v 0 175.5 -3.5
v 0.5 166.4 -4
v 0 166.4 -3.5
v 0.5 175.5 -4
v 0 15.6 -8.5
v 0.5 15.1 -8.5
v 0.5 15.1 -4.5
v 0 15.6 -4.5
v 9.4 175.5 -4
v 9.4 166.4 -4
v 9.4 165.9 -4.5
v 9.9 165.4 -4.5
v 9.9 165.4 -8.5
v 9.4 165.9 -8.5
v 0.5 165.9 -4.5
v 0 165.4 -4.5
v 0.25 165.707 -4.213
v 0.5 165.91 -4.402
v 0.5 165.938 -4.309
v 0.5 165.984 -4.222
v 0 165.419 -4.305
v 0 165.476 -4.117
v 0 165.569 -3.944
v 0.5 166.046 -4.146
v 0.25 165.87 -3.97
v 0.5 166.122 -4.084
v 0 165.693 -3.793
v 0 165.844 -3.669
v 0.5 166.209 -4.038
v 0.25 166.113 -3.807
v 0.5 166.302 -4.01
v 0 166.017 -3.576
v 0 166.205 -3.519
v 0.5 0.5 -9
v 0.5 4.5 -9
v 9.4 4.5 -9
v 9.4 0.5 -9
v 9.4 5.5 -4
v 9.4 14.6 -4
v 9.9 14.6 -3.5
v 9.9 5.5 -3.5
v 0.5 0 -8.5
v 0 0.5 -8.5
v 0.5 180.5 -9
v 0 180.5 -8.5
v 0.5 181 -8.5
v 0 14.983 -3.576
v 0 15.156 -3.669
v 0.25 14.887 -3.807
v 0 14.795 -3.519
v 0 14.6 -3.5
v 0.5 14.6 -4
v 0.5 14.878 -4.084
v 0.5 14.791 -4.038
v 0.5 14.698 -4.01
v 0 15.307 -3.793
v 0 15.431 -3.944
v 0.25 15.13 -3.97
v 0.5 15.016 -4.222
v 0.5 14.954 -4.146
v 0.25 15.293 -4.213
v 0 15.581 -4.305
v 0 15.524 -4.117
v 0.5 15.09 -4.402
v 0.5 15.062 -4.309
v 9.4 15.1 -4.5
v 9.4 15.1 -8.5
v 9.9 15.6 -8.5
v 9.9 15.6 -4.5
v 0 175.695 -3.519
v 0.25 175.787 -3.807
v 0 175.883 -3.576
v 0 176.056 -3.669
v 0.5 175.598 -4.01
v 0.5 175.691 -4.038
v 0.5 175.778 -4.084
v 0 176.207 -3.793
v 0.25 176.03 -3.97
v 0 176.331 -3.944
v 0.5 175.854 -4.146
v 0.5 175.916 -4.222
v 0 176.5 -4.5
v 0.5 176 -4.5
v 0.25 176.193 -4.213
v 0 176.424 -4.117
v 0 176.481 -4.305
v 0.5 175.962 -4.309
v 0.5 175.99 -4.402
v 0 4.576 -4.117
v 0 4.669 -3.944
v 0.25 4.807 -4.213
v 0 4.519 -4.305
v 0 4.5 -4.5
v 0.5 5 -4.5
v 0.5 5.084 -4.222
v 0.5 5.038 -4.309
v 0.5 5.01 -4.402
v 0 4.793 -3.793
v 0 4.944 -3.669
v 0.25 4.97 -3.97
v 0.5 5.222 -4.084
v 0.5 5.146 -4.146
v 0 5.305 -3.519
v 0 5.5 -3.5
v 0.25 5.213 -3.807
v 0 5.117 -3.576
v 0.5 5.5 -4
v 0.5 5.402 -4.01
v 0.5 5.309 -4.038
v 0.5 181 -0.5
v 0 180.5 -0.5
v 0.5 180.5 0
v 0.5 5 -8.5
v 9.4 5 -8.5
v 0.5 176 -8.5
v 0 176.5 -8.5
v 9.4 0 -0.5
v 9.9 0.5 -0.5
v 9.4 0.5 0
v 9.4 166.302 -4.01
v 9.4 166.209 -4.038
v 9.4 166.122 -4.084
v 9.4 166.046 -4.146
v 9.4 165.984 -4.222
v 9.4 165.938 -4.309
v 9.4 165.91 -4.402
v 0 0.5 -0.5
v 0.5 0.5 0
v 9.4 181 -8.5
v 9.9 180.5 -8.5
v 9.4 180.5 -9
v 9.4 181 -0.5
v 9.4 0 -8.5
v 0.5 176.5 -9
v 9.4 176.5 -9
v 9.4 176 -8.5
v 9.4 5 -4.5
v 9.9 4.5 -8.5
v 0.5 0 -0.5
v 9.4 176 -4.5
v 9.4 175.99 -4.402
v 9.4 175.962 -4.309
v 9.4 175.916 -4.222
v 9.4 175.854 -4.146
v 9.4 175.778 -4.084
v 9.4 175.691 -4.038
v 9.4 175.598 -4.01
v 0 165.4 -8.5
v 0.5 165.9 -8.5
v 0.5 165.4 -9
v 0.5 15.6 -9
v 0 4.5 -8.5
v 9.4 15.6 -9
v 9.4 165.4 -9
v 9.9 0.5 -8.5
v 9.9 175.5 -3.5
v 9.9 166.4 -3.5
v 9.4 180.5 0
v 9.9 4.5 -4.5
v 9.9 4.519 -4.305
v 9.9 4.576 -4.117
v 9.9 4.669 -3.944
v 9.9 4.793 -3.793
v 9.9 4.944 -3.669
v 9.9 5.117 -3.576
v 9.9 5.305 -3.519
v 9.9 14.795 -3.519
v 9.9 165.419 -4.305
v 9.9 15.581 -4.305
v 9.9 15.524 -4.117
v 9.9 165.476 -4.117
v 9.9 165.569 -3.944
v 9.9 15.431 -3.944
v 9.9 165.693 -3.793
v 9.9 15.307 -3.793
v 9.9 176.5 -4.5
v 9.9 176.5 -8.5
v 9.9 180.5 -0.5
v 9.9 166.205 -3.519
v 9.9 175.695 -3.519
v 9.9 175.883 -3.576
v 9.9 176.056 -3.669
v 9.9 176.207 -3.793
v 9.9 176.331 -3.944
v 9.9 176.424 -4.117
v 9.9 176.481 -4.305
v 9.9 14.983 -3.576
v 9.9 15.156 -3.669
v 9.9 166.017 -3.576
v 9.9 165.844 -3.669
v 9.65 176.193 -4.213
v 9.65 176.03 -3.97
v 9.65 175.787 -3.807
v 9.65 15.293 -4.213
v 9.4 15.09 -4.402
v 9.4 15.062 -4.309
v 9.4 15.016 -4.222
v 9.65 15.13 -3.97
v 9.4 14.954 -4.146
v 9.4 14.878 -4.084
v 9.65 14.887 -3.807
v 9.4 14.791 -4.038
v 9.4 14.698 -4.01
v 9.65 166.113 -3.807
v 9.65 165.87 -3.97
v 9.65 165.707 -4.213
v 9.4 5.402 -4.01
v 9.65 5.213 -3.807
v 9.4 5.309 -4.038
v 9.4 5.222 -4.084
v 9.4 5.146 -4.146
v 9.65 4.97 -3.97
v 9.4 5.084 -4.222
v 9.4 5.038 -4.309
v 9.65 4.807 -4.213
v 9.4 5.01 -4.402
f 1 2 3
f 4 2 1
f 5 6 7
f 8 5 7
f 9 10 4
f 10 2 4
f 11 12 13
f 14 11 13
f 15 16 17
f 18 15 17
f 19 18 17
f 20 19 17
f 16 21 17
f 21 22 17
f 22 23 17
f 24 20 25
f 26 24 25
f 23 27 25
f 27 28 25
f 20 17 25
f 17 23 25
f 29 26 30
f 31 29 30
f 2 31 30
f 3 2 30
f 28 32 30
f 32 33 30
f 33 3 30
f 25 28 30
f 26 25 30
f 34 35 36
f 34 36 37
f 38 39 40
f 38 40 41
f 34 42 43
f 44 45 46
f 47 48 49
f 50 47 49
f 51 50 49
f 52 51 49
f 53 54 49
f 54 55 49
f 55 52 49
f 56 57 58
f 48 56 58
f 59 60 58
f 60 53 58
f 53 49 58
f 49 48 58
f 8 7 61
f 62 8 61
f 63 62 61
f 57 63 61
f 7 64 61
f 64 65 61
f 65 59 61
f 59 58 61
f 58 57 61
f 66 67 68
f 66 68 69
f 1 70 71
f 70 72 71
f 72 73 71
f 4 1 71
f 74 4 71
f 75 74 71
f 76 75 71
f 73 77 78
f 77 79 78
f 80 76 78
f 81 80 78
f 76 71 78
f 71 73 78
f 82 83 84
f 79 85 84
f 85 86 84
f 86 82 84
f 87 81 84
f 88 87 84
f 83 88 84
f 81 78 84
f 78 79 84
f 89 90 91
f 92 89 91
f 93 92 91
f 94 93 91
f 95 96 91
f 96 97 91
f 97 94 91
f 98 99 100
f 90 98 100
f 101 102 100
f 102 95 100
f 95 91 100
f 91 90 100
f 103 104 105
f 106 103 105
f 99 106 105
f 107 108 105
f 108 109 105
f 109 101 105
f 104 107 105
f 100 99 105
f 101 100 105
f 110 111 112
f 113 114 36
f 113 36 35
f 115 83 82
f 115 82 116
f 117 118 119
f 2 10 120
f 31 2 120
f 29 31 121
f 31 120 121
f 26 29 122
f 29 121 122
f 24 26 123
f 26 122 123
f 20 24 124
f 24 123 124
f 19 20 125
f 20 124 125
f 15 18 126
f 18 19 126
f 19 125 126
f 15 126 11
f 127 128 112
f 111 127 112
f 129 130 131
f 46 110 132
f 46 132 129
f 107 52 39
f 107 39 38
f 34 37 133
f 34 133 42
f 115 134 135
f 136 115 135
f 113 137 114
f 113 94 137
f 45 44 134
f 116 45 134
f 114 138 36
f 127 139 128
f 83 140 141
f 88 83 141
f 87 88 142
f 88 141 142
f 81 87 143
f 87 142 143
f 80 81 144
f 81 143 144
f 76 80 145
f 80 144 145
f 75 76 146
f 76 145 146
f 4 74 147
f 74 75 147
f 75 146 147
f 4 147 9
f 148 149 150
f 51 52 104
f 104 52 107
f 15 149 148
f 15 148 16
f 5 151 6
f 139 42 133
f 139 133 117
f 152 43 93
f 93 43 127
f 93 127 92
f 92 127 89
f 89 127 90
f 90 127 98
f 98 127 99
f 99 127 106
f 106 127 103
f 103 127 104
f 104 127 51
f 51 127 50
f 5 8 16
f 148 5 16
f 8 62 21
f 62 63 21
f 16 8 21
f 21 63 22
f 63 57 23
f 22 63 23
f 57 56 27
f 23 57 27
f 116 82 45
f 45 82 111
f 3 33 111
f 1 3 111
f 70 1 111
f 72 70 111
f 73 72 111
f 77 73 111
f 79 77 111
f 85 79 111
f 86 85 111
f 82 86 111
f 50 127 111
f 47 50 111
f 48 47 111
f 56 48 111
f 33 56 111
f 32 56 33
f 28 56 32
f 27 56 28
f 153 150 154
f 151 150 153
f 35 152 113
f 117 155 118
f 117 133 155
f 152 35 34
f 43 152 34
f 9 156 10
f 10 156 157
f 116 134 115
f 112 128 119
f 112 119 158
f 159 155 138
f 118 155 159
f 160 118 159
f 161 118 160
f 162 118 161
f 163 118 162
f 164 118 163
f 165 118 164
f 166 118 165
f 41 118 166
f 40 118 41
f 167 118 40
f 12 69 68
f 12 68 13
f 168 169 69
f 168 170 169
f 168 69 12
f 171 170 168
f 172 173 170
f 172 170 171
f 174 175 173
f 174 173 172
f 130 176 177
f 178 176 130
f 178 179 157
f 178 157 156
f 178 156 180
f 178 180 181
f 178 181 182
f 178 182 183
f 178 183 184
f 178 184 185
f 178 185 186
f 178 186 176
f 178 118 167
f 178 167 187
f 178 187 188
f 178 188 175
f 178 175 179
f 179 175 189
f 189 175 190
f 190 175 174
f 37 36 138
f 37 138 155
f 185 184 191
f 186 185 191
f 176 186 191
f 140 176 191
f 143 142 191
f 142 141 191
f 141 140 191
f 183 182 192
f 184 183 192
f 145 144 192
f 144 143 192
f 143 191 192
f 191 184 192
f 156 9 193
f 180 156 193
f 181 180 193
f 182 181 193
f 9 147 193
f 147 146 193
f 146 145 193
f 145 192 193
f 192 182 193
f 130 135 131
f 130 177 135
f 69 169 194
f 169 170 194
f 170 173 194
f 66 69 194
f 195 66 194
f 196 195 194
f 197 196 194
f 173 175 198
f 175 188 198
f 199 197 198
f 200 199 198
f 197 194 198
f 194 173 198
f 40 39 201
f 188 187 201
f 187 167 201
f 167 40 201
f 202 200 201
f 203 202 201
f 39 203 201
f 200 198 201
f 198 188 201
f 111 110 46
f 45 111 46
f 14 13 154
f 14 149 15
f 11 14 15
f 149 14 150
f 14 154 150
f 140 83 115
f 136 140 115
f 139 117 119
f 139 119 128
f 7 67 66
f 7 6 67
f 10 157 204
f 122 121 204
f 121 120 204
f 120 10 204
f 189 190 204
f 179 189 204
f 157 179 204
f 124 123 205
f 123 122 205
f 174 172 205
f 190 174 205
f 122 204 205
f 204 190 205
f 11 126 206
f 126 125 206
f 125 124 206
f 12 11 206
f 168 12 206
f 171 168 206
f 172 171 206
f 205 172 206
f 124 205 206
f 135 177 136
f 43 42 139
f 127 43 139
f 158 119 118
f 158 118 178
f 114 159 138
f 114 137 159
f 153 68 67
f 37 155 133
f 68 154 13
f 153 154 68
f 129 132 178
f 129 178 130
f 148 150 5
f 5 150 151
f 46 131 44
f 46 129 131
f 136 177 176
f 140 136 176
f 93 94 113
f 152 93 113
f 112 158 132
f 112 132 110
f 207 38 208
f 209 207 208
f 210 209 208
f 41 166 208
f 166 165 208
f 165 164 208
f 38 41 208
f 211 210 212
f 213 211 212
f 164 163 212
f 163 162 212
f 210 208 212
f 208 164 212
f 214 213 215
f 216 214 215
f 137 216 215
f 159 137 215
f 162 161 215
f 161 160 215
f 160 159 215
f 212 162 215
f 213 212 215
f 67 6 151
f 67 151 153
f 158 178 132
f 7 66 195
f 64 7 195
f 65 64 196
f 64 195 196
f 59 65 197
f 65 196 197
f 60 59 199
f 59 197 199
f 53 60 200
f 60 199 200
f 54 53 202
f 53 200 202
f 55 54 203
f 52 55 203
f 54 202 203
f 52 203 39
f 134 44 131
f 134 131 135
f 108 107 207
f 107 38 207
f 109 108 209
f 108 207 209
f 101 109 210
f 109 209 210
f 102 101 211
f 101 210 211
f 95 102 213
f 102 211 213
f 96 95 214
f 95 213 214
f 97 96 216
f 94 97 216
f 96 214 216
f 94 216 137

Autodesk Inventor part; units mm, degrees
ref_plane "YZ Plane" through (0, 0, 0) normal (1, 0, 0) x (0, 1, 0)
ref_plane "XZ Plane" through (0, 0, 0) normal (0, 1, 0) x (-1, 0, 0)
ref_plane "XY Plane" through (0, 0, 0) normal (0, 0, 1) x (1, 0, 0)
sketch "Sketch1" plane through (0, 0, 0) normal (1, 0, 0) x (0, 1, 0)
  line L0 (0, 0) -> (181, 0)
  line L1 (181, 0) -> (181, -9)
  line L2 (0, -9) -> (0, 0)
  line L3 (15.1, -9) -> (15.1, -4)
  line L4 (15.1, -4) -> (5, -4)
  line L5 (5, -4) -> (5, -9)
  line L6 (165.9, -9) -> (165.9, -4)
  line L7 (165.9, -4) -> (176, -4)
  line L8 (176, -4) -> (176, -9)
  line L9 (5, -9) -> (0, -9)
  line L10 (181, -9) -> (176, -9)
  line L11 (165.9, -9) -> (15.1, -9)
  dimension "d0" = 181
  dimension "d1" = 10.1
  dimension "d3" = 10.1
  dimension "d5" = 5
  dimension "d7" = 5
  dimension "d8" = 5
  dimension "d11" = 9
  dimension "d12" = 171
  dimension "d17" = 9
  dimension "d18" = 9
extrude "Extrusion1" add sketch "Sketch1" along normal blind 9.9
fillet "Fillet1" radius 0.5 4 edges at (4.95, 176, -4) (4.95, 165.9, -4) (4.95, 15.1, -4) (4.95, 5, -4)
chamfer "Chamfer1" distance 0.5 angle 45 40 edges at (9.9, 90.5, 0) (9.9, 90.5, -9) (9.9, 15.1, -6.75) (9.9, 14.9536, -4.1464) (9.9, 10.05, -4) (9.9, 5.1464, -4.1464) (9.9, 5, -6.75) (9.9, 0, -4.5) (9.9, 2.5, -9) (4.95, 0, -9) (0, 0, -4.5) (4.95, 0, 0) (0, 90.5, 0) (9.9, 176, -6.75) (9.9, 175.8536, -4.1464) (9.9, 170.95, -4) (9.9, 166.0464, -4.1464) (9.9, 165.9, -6.75) (9.9, 178.5, -9) (9.9, 181, -4.5) (0, 181, -4.5) (0, 178.5, -9) (4.95, 176, -9) (4.95, 181, -9) (4.95, 181, 0) (4.95, 15.1, -9) (4.95, 165.9, -9) (0, 170.95, -4) (0, 175.8536, -4.1464) (0, 176, -6.75) (0, 166.0464, -4.1464) (0, 165.9, -6.75) (0, 90.5, -9) (0, 15.1, -6.75) (0, 14.9536, -4.1464) (0, 10.05, -4) (0, 5.1464, -4.1464) (0, 5, -6.75) (0, 2.5, -9) (4.95, 5, -9)
equation "\"d5\" = -0.5 * d12 + 0.5 * d0"
equation "\"d17\" = d11"
equation "\"d18\" = d17"
properties part number "LegsStabilizer"
